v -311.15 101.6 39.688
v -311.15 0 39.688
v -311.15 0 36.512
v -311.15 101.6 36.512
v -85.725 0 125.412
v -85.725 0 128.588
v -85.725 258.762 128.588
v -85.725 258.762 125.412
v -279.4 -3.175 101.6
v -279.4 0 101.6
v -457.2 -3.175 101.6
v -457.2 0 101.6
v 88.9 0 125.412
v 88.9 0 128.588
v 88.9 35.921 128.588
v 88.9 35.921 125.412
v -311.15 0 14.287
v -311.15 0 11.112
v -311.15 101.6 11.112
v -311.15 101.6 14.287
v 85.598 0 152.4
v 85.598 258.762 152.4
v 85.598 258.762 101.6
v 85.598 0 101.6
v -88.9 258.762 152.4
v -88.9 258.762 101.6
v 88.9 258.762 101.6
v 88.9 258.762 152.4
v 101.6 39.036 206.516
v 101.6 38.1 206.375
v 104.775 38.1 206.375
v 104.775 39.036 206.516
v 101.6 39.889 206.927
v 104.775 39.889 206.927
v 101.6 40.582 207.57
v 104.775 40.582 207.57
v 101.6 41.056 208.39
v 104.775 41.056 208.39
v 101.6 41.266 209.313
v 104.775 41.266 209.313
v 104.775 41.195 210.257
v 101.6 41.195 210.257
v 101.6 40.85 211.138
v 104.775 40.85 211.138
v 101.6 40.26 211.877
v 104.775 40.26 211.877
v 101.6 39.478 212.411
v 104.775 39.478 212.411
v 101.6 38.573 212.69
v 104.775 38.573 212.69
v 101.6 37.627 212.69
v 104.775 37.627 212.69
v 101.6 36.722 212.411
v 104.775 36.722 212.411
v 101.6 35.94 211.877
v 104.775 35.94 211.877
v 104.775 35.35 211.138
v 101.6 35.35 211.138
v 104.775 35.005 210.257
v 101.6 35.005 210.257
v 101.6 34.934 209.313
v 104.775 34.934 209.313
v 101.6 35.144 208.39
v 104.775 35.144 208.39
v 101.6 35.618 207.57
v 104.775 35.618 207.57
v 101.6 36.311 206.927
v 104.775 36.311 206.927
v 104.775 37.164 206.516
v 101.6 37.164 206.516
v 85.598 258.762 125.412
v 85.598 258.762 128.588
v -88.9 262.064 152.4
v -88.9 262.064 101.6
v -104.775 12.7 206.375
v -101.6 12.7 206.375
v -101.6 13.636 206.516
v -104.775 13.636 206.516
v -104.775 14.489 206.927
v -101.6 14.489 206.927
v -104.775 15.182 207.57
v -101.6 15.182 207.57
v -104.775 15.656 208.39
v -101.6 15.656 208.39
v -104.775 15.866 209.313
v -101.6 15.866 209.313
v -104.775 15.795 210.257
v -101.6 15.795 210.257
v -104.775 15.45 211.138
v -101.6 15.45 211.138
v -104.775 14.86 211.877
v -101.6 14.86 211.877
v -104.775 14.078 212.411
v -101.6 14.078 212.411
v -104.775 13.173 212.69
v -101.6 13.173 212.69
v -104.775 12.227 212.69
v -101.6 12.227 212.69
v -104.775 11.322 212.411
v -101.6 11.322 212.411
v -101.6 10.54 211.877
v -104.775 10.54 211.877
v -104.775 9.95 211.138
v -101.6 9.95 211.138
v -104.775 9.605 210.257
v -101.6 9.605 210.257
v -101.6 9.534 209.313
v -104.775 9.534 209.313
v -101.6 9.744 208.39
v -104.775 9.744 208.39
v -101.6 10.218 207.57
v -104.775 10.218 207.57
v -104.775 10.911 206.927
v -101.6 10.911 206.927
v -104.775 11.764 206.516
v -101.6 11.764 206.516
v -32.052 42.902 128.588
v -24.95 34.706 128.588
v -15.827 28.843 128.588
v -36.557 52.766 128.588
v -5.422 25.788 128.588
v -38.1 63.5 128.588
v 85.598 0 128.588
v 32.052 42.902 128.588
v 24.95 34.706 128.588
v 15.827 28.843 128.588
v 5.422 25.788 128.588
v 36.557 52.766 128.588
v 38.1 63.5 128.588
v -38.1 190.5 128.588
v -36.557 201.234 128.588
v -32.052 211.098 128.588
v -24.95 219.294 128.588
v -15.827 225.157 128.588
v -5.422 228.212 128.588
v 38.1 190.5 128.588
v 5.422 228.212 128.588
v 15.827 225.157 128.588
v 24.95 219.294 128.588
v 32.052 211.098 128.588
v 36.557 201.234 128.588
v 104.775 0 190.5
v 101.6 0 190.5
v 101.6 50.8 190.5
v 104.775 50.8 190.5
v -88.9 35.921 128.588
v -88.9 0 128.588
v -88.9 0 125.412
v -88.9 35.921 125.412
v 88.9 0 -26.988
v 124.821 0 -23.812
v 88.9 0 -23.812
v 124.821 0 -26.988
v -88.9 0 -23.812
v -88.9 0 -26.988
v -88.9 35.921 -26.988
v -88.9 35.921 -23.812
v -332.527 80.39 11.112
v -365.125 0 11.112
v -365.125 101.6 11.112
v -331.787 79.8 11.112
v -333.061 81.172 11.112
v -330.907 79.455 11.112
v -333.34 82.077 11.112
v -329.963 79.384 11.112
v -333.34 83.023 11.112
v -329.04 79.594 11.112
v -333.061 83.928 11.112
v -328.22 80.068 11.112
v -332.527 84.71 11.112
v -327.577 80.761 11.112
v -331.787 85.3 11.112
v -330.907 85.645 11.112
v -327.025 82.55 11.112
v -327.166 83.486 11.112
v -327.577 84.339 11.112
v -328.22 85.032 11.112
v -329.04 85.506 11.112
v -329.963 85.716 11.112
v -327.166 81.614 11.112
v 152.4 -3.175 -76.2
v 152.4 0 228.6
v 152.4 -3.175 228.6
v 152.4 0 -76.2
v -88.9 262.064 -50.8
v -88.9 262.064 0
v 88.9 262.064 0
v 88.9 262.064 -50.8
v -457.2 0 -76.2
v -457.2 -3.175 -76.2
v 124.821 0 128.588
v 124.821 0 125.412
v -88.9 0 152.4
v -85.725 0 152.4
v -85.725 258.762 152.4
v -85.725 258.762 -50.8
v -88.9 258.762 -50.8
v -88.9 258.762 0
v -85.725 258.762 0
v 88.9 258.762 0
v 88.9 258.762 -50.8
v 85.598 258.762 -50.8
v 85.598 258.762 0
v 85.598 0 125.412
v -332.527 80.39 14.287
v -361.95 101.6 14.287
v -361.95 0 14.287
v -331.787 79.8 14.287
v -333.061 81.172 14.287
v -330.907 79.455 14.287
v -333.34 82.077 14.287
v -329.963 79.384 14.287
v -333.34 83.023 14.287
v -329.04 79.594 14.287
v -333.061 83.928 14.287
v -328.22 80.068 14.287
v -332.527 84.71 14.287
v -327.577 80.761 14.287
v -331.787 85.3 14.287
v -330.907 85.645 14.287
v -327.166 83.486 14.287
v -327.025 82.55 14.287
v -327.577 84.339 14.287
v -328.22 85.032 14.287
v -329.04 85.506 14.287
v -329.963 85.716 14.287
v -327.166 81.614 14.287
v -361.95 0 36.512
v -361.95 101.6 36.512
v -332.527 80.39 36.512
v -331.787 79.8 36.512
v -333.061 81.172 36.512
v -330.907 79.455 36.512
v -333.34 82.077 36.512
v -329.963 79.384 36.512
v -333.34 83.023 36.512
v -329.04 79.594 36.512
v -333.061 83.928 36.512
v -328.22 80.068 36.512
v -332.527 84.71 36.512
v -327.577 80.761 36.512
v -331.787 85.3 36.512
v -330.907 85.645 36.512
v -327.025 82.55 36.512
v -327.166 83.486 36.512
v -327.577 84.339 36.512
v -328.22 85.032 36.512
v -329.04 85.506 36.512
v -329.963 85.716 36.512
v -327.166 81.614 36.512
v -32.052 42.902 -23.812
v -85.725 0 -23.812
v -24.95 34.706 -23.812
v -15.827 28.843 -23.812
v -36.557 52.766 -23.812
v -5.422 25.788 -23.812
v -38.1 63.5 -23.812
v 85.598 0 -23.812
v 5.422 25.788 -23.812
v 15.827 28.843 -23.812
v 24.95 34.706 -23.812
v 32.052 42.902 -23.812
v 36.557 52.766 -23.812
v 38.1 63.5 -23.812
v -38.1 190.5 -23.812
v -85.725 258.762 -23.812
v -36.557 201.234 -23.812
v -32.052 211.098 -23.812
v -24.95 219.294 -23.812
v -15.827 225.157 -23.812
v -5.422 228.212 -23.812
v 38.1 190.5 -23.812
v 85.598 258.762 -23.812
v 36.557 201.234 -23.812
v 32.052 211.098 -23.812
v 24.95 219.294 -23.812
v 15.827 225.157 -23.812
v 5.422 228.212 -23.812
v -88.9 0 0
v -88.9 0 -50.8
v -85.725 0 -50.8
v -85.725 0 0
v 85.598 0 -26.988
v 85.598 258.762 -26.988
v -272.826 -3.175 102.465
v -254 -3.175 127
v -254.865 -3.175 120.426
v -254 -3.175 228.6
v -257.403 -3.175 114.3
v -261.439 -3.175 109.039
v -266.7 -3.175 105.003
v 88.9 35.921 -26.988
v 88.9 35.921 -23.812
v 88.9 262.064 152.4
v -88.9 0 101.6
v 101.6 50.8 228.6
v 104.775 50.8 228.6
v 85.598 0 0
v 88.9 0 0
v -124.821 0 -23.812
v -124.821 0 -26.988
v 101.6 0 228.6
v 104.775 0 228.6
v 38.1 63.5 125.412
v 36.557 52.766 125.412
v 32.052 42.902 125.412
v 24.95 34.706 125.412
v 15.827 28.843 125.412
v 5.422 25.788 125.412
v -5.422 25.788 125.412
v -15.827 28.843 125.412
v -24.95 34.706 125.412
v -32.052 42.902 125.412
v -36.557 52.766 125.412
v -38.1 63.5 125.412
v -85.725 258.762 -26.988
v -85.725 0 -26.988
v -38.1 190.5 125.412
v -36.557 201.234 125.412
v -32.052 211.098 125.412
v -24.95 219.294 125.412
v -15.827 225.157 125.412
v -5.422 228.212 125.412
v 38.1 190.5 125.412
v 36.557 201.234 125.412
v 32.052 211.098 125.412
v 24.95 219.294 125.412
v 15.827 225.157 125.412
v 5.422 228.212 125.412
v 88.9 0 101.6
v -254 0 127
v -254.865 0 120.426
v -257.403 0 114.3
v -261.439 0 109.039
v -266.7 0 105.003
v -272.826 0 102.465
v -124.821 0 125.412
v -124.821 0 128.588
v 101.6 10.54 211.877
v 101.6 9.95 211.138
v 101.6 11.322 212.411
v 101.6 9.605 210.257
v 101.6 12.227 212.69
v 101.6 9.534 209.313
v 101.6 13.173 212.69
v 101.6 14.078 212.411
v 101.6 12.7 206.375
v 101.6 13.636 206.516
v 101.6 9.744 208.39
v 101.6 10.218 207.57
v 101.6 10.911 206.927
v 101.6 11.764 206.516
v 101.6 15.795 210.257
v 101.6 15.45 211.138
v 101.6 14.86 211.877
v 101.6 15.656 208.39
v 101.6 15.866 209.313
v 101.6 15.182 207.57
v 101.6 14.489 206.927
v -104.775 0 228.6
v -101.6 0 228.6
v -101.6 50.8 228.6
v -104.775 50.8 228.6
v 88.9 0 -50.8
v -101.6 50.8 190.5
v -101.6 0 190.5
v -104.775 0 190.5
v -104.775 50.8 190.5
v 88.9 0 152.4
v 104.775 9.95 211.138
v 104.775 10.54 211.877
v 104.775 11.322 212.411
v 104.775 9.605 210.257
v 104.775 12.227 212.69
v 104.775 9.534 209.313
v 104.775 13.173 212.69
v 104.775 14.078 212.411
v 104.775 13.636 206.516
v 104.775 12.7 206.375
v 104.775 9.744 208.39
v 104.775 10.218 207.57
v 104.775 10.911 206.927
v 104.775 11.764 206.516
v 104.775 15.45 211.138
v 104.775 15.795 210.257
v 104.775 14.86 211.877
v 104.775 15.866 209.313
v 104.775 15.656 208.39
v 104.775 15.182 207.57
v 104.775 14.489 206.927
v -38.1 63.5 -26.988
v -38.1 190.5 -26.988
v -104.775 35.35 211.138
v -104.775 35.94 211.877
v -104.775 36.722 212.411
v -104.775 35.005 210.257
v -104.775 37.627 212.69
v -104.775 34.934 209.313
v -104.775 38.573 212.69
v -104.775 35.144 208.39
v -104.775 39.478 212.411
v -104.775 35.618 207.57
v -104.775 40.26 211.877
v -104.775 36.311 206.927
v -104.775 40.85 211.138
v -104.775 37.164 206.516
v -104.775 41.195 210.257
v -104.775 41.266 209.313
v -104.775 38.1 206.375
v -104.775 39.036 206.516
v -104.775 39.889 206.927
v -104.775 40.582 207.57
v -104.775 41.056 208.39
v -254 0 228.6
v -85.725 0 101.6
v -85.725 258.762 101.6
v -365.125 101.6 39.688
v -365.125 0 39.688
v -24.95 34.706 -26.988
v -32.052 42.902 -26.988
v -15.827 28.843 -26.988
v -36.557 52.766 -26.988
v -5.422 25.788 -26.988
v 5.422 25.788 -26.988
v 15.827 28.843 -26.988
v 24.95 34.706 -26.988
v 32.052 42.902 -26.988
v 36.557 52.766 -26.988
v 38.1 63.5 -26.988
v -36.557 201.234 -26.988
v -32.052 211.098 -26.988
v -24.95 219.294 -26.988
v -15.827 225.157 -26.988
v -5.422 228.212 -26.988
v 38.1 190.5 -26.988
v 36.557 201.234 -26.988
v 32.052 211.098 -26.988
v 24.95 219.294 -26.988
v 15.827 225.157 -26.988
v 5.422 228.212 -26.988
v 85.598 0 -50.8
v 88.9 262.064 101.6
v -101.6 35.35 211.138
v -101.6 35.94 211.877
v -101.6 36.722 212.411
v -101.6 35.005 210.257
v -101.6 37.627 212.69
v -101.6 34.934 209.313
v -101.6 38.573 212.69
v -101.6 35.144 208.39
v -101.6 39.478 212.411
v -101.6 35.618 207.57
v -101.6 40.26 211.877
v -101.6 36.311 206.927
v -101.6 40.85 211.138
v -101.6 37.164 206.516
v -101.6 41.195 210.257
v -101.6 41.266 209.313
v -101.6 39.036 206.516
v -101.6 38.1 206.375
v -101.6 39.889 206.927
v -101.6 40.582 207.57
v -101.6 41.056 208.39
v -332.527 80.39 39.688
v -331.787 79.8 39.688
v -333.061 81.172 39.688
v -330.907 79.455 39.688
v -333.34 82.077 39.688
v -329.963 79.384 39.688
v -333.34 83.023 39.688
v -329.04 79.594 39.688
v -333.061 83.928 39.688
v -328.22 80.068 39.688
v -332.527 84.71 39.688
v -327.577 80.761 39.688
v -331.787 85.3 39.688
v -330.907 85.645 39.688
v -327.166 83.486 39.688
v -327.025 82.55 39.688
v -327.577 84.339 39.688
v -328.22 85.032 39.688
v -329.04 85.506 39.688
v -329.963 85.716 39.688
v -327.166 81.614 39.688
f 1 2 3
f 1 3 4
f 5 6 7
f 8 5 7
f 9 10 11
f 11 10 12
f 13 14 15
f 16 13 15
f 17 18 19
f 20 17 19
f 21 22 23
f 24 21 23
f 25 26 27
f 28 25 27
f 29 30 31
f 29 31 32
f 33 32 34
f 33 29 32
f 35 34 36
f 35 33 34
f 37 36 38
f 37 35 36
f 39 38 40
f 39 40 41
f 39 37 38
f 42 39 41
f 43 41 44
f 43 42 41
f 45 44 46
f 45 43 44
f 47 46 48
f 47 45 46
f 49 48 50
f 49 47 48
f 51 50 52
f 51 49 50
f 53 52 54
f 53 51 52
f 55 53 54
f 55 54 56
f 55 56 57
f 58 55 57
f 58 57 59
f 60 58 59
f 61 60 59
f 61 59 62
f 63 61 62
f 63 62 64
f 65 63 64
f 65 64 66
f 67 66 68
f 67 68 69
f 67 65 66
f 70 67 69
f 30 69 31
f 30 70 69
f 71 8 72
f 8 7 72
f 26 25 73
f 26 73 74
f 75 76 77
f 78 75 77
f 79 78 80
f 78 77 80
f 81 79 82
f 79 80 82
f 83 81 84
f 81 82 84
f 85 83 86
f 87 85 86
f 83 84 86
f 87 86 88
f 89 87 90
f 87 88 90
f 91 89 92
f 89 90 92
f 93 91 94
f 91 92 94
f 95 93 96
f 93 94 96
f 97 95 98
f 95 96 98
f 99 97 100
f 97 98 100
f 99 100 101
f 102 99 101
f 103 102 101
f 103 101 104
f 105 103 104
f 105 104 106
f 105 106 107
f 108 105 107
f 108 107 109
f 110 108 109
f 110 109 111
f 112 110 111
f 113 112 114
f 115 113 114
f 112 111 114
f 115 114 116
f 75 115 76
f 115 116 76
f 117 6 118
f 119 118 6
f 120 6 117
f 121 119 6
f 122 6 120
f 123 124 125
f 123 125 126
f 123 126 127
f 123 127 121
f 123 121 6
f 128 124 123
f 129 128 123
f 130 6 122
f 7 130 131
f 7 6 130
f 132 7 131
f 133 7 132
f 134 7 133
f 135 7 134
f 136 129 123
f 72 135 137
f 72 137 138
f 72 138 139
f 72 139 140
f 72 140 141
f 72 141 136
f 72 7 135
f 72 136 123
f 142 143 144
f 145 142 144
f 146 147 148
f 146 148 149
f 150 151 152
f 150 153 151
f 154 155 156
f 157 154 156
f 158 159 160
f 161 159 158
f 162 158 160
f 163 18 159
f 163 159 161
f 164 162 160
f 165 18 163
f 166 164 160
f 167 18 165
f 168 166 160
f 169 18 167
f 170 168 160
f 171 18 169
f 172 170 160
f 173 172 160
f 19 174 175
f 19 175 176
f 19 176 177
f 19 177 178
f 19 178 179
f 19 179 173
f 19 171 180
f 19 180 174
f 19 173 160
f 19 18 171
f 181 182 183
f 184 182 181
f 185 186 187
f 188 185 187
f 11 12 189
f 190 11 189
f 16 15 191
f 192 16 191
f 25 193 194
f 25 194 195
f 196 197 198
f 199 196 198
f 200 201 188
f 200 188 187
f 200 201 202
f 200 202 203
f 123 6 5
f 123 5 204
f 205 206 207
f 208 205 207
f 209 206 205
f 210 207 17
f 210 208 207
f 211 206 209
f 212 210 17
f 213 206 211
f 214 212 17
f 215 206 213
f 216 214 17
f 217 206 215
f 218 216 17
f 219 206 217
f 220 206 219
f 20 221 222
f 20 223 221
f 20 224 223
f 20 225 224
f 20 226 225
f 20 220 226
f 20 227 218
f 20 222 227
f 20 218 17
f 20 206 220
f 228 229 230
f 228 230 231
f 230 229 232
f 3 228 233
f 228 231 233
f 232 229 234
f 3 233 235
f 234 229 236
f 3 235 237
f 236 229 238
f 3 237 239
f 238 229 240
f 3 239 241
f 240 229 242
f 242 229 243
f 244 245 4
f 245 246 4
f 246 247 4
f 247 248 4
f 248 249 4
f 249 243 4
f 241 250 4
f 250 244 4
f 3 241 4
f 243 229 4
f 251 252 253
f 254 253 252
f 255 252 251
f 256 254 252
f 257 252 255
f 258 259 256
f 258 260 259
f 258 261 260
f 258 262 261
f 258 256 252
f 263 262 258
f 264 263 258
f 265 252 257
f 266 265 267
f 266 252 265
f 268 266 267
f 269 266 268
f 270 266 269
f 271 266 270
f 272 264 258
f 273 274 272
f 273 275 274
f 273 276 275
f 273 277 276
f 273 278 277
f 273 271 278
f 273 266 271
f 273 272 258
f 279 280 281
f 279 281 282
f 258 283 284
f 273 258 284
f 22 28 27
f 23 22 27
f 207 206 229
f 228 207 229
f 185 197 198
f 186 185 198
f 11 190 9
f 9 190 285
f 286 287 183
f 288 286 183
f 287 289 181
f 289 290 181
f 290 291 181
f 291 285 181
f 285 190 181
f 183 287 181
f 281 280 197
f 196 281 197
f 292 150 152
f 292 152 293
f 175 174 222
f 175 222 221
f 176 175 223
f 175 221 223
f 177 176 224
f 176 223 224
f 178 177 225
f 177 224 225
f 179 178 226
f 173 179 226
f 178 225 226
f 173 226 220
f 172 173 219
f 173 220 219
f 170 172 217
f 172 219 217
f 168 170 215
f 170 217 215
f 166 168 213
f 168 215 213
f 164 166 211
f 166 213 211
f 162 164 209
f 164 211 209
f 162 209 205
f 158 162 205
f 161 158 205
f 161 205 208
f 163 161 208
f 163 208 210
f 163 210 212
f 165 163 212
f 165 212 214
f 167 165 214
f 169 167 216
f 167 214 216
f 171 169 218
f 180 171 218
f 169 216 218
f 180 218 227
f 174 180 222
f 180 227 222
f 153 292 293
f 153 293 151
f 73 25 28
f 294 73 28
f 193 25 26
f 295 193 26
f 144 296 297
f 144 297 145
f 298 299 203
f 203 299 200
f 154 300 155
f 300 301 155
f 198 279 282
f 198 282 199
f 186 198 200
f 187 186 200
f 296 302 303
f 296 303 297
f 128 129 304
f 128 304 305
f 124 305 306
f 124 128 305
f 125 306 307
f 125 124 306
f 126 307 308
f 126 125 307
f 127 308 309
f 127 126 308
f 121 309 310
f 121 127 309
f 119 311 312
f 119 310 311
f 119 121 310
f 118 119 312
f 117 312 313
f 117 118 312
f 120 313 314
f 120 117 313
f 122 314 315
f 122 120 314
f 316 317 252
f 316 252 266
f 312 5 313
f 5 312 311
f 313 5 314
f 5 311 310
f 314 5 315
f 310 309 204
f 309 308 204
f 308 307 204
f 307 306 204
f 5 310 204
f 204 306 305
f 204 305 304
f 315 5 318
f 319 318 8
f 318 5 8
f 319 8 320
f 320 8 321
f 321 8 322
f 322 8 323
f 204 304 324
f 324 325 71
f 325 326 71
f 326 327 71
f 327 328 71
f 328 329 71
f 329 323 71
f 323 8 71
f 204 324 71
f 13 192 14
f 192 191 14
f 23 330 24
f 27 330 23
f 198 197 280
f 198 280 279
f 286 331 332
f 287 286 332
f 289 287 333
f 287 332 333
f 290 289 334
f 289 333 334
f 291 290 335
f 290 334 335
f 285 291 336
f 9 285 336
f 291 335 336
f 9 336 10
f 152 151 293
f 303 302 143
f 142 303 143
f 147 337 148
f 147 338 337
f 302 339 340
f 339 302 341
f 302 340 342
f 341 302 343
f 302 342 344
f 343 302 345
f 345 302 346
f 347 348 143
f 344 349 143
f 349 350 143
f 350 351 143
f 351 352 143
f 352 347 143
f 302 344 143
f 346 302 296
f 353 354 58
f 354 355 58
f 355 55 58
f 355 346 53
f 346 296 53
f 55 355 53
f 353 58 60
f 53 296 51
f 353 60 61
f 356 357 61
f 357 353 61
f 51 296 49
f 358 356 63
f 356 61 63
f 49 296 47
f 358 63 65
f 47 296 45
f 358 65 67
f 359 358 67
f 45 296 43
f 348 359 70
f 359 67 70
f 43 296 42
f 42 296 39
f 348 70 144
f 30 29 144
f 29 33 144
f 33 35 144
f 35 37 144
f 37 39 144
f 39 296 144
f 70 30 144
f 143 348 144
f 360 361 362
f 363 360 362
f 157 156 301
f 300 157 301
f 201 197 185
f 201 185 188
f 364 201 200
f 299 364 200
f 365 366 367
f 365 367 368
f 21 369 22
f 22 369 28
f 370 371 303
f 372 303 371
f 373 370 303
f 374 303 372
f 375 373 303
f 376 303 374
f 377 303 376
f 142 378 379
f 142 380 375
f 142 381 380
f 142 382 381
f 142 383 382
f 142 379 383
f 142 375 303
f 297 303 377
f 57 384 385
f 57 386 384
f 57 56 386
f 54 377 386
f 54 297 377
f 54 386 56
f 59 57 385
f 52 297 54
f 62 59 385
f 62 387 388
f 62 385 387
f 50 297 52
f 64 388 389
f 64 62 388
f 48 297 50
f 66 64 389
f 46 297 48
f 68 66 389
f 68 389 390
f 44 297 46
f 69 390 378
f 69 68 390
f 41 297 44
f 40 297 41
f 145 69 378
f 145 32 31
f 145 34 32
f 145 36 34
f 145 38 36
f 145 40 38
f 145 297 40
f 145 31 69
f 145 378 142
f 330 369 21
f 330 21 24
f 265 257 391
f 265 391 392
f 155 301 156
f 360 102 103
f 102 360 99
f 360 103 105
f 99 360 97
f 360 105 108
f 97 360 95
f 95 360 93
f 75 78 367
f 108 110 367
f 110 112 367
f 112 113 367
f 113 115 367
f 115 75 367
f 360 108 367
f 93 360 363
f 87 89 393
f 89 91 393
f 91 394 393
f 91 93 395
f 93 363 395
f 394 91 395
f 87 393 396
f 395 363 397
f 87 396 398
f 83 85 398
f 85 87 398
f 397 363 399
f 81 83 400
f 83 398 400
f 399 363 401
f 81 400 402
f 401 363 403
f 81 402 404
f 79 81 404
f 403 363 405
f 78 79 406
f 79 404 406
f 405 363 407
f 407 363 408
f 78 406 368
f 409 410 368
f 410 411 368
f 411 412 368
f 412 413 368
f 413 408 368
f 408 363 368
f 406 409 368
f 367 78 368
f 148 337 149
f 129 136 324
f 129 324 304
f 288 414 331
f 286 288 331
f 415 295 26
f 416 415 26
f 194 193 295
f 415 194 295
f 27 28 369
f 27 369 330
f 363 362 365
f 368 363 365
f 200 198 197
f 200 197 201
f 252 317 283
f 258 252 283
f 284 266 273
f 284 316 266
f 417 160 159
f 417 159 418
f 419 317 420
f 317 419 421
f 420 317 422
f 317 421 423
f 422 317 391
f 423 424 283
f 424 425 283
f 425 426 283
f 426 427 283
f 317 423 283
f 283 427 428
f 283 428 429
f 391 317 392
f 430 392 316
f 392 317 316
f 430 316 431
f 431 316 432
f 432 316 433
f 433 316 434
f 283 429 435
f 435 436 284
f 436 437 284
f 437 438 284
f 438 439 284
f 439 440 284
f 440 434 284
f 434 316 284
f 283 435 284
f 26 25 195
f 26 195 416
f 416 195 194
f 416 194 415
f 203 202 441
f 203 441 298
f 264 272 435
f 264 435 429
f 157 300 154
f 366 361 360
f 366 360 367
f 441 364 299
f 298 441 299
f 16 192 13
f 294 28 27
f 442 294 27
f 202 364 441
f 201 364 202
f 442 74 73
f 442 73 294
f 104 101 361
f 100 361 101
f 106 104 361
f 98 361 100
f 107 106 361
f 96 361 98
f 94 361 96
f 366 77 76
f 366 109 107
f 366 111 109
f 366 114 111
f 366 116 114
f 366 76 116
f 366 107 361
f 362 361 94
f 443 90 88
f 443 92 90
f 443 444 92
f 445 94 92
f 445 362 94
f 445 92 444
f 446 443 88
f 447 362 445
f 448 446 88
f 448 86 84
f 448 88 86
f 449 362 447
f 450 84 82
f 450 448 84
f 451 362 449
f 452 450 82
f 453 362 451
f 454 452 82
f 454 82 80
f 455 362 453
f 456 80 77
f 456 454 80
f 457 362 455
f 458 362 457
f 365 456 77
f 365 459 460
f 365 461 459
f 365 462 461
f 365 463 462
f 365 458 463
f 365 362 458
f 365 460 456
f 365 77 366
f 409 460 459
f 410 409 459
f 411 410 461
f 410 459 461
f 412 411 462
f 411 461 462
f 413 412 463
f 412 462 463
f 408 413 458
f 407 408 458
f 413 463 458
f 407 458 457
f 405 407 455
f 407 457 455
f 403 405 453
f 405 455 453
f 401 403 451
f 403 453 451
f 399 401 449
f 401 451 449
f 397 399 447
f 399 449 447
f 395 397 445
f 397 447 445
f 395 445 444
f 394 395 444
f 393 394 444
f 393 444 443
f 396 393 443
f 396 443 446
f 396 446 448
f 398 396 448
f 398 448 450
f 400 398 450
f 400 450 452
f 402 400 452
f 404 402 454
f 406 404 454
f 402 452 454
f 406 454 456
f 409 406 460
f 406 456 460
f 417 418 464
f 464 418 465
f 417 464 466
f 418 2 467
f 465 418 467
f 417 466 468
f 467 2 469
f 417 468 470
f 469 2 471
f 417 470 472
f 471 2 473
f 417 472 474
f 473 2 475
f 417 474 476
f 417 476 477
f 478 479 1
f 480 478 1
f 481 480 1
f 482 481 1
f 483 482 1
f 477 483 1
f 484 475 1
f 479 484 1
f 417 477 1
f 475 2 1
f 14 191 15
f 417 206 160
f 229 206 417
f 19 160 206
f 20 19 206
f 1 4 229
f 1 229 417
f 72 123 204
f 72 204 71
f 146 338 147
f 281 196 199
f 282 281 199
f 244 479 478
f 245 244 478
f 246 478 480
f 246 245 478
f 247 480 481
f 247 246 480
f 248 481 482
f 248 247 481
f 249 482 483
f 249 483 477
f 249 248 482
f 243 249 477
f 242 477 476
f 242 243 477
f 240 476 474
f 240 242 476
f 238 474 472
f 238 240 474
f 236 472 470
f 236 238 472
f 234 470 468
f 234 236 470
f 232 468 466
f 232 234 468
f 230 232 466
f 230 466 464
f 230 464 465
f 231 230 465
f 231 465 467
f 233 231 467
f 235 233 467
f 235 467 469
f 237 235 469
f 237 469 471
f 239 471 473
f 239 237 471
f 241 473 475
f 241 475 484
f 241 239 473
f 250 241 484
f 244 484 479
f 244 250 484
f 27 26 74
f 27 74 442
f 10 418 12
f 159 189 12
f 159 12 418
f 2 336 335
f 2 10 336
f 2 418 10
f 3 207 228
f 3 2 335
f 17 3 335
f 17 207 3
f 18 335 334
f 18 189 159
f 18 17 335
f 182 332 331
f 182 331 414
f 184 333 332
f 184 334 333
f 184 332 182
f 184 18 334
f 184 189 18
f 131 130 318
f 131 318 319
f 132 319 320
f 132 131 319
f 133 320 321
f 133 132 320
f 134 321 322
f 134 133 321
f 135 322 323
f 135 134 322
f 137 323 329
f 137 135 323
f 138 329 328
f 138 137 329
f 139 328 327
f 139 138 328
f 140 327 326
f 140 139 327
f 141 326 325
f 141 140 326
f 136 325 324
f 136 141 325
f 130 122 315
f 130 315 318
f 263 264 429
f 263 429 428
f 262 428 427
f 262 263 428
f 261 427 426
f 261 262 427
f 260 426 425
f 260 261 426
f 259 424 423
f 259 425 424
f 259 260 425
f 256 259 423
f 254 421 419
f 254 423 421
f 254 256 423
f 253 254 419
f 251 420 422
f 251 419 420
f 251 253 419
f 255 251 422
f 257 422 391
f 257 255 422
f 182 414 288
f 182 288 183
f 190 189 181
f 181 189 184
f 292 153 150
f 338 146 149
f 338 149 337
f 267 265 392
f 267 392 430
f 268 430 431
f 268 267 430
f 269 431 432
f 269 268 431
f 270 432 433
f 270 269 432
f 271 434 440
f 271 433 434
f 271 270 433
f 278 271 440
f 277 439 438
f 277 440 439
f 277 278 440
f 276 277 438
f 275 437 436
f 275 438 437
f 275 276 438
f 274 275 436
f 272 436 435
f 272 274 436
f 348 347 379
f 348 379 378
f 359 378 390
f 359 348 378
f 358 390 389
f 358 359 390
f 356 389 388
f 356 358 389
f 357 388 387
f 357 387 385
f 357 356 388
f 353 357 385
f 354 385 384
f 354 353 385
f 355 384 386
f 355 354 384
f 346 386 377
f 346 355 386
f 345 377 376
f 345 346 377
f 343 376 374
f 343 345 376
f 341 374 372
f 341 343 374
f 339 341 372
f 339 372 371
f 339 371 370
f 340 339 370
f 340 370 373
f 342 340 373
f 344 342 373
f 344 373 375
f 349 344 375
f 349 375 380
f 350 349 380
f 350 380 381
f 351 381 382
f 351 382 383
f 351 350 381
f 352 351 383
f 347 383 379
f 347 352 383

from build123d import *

# Parameters (mm, degrees)
SKETCH2_W           = 609.6
SKETCH2_H           = 304.8
BOSS_EXTRUDE1_DEPTH = 3.175
SKETCH3_W           = 50.8
SKETCH3_H           = 258.7625
BOSS_EXTRUDE2_DEPTH = 3.302
SKETCH6_W           = 50.8
SKETCH6_H           = 258.7625
BOSS_EXTRUDE5_DEPTH = 3.175
SKETCH4_W           = 177.8
SKETCH4_H           = 50.8
BOSS_EXTRUDE3_DEPTH = 3.302
SKETCH5_W           = 171.323
SKETCH5_H           = 258.7625
BOSS_EXTRUDE4_DEPTH = 1.5875
SKETCH8_W           = 50.8
SKETCH8_H           = 101.6
SKETCH8_R           = 3.175
BOSS_EXTRUDE6_DEPTH = 1.5875
SKETCH9_W           = 28.575
SKETCH9_H           = 101.6
BOSS_EXTRUDE7_DEPTH = 3.175
BOSS_EXTRUDE8_DEPTH = 1.5875
CUT_EXTRUDE1_DEPTH  = 566.373825284
CUT_EXTRUDE2_DEPTH  = 575.428065262
SKETCH13_W          = 38.1
SKETCH13_H          = 50.8
SKETCH13_R          = 3.175
BOSS_EXTRUDE9_DEPTH = 3.175


with BuildPart() as part:
    # Sketch2 → Boss-Extrude1 (new body)
    with BuildSketch(Plane(origin=(0, 0, 0), x_dir=(1, 0, 0), z_dir=(0, 1, 0))):
        with Locations((-152.4, -76.2)):
            Rectangle(SKETCH2_W, SKETCH2_H)
    extrude(amount=-BOSS_EXTRUDE1_DEPTH)



with BuildPart() as body_2:
    # Sketch3 → Boss-Extrude2 (new body)
    with BuildSketch(Plane(origin=(88.9, 0, 0), x_dir=(0, 0, -1), z_dir=(1, 0, 0))):
        with Locations((-127, 129.38125)):
            Rectangle(SKETCH3_W, SKETCH3_H)
    extrude(amount=-BOSS_EXTRUDE2_DEPTH)


with BuildPart() as body_3:
    # Sketch6 → Boss-Extrude5 (new body)
    with BuildSketch(Plane(origin=(-88.9, 0, 0), x_dir=(0, 0, -1), z_dir=(1, 0, 0))):
        with Locations((-127, 129.38125)):
            Rectangle(SKETCH6_W, SKETCH6_H)
    extrude(amount=BOSS_EXTRUDE5_DEPTH)


with BuildPart() as body_4:
    # Sketch4 → Boss-Extrude3 (new body)
    with BuildSketch(Plane(origin=(0, 258.7625, 0), x_dir=(1, 0, 0), z_dir=(0, 1, 0))):
        with Locations((0, -127)):
            Rectangle(SKETCH4_W, SKETCH4_H)
    extrude(amount=BOSS_EXTRUDE3_DEPTH)


with BuildPart() as body_5:
    # Sketch5 → Boss-Extrude4 (new, symmetric)
    with BuildSketch(Plane.XY.offset(127)):
        with Locations((-0.0635, 129.38125)):
            Rectangle(SKETCH5_W, SKETCH5_H)
    extrude(amount=BOSS_EXTRUDE4_DEPTH, both=True)


with BuildPart() as body_6:
    # Mirror4: mirrored copy
    add(body_5.part.mirror(Plane.XY.offset(50.8)))


with BuildPart() as body_7:
    # Mirror4 2: mirrored copy
    add(body_2.part.mirror(Plane.XY.offset(50.8)))


with BuildPart() as body_8:
    # Mirror4 3: mirrored copy
    add(body_4.part.mirror(Plane.XY.offset(50.8)))


with BuildPart() as body_9:
    # Mirror4 4: mirrored copy
    add(body_3.part.mirror(Plane.XY.offset(50.8)))


with BuildPart() as body_10:
    # Sketch8 → Boss-Extrude6 (new, symmetric)
    with BuildSketch(Plane.XY.offset(38.1)):
        with Locations((-336.55, 50.8)):
            Rectangle(SKETCH8_W, SKETCH8_H)
        with Locations((-330.2, 82.55)):
            Circle(SKETCH8_R, mode=Mode.SUBTRACT)
    extrude(amount=BOSS_EXTRUDE6_DEPTH, both=True)


with BuildPart() as body_11:
    # Mirror5: mirrored copy
    add(body_10.part.mirror(Plane.XY.offset(25.4)))


with BuildPart() as part_1:
    add(part.part)

    add(body_10.part)  # Boss-Extrude7 merges body 10

    add(body_11.part)  # Boss-Extrude7 merges body 11
    # Sketch9 → Boss-Extrude7 (add)
    with BuildSketch(Plane.ZY.offset(361.95)):
        with Locations((25.4, 50.8)):
            Rectangle(SKETCH9_W, SKETCH9_H)
    extrude(amount=BOSS_EXTRUDE7_DEPTH)

    # Sketch12 → Cut-Extrude2 (cut, through all)
    with BuildSketch(Plane(origin=(0, 0, 0), x_dir=(1, 0, 0), z_dir=(0, 1, 0))):
        with BuildLine():
            Line((-457.2, -228.6), (-254, -228.6))
            Line((-254, -228.6), (-254, -127))
            ThreePointArc((-254, -127), (-261.439487758, -109.039487758), (-279.4, -101.6))
            Line((-279.4, -101.6), (-457.2, -101.6))
            Line((-457.2, -101.6), (-457.2, -228.6))
        make_face()
    extrude(amount=-CUT_EXTRUDE2_DEPTH, mode=Mode.SUBTRACT)


with BuildPart() as body_10_2:
    # Sketch10 → Boss-Extrude8 (new, symmetric)
    with BuildSketch(Plane.XY.offset(127)):
        Polygon((88.9, 35.921024484), (124.821024484, 0), (88.9, 0), align=None)
    extrude(amount=BOSS_EXTRUDE8_DEPTH, both=True)


with BuildPart() as body_11_2:
    # Mirror6: mirrored copy
    add(body_10_2.part.mirror(Plane.XY.offset(50.8)))


with BuildPart() as body_12:
    # Mirror7: mirrored copy
    add(body_10_2.part.mirror(Plane(origin=(0, 0, 0), x_dir=(0, 0, 1), z_dir=(1, 0, 0))))


with BuildPart() as body_13:
    # Mirror7 2: mirrored copy
    add(body_11_2.part.mirror(Plane(origin=(0, 0, 0), x_dir=(0, 0, 1), z_dir=(1, 0, 0))))


with BuildPart() as cut_extrude1_tool:
    # Sketch11 → Cut-Extrude1 (new, through all)
    with BuildSketch(Plane.XY.offset(128.5875)):
        with BuildLine():
            Line((-38.1, 63.5), (-38.1, 190.5))
            ThreePointArc((-38.1, 190.5), (0, 228.6), (38.1, 190.5))
            Line((38.1, 190.5), (38.1, 63.5))
            ThreePointArc((38.1, 63.5), (0, 25.4), (-38.1, 63.5))
        make_face()
    extrude(amount=-CUT_EXTRUDE1_DEPTH)


with BuildPart() as body_5_1:
    add(body_5.part)

    # Cut-Extrude1: cut by cut_extrude1_tool
    add(cut_extrude1_tool.part, mode=Mode.SUBTRACT)


with BuildPart() as body_6_1:
    add(body_6.part)

    # Cut-Extrude1: cut by cut_extrude1_tool
    add(cut_extrude1_tool.part, mode=Mode.SUBTRACT)


with BuildPart() as body_14:
    # Sketch13 → Boss-Extrude9 (new body)
    with BuildSketch(Plane(origin=(101.6, 0, 0), x_dir=(0, 0, -1), z_dir=(1, 0, 0))):
        with Locations((-209.55, 25.4)):
            Rectangle(SKETCH13_W, SKETCH13_H)
        with Locations((-209.55, 38.1)):
            Circle(SKETCH13_R, mode=Mode.SUBTRACT)
        with Locations((-209.55, 12.7)):
            Circle(SKETCH13_R, mode=Mode.SUBTRACT)
    extrude(amount=BOSS_EXTRUDE9_DEPTH)


with BuildPart() as body_15:
    # Mirror8: mirrored copy
    add(body_14.part.mirror(Plane(origin=(0, 0, 0), x_dir=(0, 0, 1), z_dir=(1, 0, 0))))


solid = Compound([body_2.part, body_3.part, body_4.part, body_7.part, body_8.part, body_9.part, part_1.part, body_10_2.part, body_11_2.part, body_12.part, body_13.part, body_5_1.part, body_6_1.part, body_14.part, body_15.part])
